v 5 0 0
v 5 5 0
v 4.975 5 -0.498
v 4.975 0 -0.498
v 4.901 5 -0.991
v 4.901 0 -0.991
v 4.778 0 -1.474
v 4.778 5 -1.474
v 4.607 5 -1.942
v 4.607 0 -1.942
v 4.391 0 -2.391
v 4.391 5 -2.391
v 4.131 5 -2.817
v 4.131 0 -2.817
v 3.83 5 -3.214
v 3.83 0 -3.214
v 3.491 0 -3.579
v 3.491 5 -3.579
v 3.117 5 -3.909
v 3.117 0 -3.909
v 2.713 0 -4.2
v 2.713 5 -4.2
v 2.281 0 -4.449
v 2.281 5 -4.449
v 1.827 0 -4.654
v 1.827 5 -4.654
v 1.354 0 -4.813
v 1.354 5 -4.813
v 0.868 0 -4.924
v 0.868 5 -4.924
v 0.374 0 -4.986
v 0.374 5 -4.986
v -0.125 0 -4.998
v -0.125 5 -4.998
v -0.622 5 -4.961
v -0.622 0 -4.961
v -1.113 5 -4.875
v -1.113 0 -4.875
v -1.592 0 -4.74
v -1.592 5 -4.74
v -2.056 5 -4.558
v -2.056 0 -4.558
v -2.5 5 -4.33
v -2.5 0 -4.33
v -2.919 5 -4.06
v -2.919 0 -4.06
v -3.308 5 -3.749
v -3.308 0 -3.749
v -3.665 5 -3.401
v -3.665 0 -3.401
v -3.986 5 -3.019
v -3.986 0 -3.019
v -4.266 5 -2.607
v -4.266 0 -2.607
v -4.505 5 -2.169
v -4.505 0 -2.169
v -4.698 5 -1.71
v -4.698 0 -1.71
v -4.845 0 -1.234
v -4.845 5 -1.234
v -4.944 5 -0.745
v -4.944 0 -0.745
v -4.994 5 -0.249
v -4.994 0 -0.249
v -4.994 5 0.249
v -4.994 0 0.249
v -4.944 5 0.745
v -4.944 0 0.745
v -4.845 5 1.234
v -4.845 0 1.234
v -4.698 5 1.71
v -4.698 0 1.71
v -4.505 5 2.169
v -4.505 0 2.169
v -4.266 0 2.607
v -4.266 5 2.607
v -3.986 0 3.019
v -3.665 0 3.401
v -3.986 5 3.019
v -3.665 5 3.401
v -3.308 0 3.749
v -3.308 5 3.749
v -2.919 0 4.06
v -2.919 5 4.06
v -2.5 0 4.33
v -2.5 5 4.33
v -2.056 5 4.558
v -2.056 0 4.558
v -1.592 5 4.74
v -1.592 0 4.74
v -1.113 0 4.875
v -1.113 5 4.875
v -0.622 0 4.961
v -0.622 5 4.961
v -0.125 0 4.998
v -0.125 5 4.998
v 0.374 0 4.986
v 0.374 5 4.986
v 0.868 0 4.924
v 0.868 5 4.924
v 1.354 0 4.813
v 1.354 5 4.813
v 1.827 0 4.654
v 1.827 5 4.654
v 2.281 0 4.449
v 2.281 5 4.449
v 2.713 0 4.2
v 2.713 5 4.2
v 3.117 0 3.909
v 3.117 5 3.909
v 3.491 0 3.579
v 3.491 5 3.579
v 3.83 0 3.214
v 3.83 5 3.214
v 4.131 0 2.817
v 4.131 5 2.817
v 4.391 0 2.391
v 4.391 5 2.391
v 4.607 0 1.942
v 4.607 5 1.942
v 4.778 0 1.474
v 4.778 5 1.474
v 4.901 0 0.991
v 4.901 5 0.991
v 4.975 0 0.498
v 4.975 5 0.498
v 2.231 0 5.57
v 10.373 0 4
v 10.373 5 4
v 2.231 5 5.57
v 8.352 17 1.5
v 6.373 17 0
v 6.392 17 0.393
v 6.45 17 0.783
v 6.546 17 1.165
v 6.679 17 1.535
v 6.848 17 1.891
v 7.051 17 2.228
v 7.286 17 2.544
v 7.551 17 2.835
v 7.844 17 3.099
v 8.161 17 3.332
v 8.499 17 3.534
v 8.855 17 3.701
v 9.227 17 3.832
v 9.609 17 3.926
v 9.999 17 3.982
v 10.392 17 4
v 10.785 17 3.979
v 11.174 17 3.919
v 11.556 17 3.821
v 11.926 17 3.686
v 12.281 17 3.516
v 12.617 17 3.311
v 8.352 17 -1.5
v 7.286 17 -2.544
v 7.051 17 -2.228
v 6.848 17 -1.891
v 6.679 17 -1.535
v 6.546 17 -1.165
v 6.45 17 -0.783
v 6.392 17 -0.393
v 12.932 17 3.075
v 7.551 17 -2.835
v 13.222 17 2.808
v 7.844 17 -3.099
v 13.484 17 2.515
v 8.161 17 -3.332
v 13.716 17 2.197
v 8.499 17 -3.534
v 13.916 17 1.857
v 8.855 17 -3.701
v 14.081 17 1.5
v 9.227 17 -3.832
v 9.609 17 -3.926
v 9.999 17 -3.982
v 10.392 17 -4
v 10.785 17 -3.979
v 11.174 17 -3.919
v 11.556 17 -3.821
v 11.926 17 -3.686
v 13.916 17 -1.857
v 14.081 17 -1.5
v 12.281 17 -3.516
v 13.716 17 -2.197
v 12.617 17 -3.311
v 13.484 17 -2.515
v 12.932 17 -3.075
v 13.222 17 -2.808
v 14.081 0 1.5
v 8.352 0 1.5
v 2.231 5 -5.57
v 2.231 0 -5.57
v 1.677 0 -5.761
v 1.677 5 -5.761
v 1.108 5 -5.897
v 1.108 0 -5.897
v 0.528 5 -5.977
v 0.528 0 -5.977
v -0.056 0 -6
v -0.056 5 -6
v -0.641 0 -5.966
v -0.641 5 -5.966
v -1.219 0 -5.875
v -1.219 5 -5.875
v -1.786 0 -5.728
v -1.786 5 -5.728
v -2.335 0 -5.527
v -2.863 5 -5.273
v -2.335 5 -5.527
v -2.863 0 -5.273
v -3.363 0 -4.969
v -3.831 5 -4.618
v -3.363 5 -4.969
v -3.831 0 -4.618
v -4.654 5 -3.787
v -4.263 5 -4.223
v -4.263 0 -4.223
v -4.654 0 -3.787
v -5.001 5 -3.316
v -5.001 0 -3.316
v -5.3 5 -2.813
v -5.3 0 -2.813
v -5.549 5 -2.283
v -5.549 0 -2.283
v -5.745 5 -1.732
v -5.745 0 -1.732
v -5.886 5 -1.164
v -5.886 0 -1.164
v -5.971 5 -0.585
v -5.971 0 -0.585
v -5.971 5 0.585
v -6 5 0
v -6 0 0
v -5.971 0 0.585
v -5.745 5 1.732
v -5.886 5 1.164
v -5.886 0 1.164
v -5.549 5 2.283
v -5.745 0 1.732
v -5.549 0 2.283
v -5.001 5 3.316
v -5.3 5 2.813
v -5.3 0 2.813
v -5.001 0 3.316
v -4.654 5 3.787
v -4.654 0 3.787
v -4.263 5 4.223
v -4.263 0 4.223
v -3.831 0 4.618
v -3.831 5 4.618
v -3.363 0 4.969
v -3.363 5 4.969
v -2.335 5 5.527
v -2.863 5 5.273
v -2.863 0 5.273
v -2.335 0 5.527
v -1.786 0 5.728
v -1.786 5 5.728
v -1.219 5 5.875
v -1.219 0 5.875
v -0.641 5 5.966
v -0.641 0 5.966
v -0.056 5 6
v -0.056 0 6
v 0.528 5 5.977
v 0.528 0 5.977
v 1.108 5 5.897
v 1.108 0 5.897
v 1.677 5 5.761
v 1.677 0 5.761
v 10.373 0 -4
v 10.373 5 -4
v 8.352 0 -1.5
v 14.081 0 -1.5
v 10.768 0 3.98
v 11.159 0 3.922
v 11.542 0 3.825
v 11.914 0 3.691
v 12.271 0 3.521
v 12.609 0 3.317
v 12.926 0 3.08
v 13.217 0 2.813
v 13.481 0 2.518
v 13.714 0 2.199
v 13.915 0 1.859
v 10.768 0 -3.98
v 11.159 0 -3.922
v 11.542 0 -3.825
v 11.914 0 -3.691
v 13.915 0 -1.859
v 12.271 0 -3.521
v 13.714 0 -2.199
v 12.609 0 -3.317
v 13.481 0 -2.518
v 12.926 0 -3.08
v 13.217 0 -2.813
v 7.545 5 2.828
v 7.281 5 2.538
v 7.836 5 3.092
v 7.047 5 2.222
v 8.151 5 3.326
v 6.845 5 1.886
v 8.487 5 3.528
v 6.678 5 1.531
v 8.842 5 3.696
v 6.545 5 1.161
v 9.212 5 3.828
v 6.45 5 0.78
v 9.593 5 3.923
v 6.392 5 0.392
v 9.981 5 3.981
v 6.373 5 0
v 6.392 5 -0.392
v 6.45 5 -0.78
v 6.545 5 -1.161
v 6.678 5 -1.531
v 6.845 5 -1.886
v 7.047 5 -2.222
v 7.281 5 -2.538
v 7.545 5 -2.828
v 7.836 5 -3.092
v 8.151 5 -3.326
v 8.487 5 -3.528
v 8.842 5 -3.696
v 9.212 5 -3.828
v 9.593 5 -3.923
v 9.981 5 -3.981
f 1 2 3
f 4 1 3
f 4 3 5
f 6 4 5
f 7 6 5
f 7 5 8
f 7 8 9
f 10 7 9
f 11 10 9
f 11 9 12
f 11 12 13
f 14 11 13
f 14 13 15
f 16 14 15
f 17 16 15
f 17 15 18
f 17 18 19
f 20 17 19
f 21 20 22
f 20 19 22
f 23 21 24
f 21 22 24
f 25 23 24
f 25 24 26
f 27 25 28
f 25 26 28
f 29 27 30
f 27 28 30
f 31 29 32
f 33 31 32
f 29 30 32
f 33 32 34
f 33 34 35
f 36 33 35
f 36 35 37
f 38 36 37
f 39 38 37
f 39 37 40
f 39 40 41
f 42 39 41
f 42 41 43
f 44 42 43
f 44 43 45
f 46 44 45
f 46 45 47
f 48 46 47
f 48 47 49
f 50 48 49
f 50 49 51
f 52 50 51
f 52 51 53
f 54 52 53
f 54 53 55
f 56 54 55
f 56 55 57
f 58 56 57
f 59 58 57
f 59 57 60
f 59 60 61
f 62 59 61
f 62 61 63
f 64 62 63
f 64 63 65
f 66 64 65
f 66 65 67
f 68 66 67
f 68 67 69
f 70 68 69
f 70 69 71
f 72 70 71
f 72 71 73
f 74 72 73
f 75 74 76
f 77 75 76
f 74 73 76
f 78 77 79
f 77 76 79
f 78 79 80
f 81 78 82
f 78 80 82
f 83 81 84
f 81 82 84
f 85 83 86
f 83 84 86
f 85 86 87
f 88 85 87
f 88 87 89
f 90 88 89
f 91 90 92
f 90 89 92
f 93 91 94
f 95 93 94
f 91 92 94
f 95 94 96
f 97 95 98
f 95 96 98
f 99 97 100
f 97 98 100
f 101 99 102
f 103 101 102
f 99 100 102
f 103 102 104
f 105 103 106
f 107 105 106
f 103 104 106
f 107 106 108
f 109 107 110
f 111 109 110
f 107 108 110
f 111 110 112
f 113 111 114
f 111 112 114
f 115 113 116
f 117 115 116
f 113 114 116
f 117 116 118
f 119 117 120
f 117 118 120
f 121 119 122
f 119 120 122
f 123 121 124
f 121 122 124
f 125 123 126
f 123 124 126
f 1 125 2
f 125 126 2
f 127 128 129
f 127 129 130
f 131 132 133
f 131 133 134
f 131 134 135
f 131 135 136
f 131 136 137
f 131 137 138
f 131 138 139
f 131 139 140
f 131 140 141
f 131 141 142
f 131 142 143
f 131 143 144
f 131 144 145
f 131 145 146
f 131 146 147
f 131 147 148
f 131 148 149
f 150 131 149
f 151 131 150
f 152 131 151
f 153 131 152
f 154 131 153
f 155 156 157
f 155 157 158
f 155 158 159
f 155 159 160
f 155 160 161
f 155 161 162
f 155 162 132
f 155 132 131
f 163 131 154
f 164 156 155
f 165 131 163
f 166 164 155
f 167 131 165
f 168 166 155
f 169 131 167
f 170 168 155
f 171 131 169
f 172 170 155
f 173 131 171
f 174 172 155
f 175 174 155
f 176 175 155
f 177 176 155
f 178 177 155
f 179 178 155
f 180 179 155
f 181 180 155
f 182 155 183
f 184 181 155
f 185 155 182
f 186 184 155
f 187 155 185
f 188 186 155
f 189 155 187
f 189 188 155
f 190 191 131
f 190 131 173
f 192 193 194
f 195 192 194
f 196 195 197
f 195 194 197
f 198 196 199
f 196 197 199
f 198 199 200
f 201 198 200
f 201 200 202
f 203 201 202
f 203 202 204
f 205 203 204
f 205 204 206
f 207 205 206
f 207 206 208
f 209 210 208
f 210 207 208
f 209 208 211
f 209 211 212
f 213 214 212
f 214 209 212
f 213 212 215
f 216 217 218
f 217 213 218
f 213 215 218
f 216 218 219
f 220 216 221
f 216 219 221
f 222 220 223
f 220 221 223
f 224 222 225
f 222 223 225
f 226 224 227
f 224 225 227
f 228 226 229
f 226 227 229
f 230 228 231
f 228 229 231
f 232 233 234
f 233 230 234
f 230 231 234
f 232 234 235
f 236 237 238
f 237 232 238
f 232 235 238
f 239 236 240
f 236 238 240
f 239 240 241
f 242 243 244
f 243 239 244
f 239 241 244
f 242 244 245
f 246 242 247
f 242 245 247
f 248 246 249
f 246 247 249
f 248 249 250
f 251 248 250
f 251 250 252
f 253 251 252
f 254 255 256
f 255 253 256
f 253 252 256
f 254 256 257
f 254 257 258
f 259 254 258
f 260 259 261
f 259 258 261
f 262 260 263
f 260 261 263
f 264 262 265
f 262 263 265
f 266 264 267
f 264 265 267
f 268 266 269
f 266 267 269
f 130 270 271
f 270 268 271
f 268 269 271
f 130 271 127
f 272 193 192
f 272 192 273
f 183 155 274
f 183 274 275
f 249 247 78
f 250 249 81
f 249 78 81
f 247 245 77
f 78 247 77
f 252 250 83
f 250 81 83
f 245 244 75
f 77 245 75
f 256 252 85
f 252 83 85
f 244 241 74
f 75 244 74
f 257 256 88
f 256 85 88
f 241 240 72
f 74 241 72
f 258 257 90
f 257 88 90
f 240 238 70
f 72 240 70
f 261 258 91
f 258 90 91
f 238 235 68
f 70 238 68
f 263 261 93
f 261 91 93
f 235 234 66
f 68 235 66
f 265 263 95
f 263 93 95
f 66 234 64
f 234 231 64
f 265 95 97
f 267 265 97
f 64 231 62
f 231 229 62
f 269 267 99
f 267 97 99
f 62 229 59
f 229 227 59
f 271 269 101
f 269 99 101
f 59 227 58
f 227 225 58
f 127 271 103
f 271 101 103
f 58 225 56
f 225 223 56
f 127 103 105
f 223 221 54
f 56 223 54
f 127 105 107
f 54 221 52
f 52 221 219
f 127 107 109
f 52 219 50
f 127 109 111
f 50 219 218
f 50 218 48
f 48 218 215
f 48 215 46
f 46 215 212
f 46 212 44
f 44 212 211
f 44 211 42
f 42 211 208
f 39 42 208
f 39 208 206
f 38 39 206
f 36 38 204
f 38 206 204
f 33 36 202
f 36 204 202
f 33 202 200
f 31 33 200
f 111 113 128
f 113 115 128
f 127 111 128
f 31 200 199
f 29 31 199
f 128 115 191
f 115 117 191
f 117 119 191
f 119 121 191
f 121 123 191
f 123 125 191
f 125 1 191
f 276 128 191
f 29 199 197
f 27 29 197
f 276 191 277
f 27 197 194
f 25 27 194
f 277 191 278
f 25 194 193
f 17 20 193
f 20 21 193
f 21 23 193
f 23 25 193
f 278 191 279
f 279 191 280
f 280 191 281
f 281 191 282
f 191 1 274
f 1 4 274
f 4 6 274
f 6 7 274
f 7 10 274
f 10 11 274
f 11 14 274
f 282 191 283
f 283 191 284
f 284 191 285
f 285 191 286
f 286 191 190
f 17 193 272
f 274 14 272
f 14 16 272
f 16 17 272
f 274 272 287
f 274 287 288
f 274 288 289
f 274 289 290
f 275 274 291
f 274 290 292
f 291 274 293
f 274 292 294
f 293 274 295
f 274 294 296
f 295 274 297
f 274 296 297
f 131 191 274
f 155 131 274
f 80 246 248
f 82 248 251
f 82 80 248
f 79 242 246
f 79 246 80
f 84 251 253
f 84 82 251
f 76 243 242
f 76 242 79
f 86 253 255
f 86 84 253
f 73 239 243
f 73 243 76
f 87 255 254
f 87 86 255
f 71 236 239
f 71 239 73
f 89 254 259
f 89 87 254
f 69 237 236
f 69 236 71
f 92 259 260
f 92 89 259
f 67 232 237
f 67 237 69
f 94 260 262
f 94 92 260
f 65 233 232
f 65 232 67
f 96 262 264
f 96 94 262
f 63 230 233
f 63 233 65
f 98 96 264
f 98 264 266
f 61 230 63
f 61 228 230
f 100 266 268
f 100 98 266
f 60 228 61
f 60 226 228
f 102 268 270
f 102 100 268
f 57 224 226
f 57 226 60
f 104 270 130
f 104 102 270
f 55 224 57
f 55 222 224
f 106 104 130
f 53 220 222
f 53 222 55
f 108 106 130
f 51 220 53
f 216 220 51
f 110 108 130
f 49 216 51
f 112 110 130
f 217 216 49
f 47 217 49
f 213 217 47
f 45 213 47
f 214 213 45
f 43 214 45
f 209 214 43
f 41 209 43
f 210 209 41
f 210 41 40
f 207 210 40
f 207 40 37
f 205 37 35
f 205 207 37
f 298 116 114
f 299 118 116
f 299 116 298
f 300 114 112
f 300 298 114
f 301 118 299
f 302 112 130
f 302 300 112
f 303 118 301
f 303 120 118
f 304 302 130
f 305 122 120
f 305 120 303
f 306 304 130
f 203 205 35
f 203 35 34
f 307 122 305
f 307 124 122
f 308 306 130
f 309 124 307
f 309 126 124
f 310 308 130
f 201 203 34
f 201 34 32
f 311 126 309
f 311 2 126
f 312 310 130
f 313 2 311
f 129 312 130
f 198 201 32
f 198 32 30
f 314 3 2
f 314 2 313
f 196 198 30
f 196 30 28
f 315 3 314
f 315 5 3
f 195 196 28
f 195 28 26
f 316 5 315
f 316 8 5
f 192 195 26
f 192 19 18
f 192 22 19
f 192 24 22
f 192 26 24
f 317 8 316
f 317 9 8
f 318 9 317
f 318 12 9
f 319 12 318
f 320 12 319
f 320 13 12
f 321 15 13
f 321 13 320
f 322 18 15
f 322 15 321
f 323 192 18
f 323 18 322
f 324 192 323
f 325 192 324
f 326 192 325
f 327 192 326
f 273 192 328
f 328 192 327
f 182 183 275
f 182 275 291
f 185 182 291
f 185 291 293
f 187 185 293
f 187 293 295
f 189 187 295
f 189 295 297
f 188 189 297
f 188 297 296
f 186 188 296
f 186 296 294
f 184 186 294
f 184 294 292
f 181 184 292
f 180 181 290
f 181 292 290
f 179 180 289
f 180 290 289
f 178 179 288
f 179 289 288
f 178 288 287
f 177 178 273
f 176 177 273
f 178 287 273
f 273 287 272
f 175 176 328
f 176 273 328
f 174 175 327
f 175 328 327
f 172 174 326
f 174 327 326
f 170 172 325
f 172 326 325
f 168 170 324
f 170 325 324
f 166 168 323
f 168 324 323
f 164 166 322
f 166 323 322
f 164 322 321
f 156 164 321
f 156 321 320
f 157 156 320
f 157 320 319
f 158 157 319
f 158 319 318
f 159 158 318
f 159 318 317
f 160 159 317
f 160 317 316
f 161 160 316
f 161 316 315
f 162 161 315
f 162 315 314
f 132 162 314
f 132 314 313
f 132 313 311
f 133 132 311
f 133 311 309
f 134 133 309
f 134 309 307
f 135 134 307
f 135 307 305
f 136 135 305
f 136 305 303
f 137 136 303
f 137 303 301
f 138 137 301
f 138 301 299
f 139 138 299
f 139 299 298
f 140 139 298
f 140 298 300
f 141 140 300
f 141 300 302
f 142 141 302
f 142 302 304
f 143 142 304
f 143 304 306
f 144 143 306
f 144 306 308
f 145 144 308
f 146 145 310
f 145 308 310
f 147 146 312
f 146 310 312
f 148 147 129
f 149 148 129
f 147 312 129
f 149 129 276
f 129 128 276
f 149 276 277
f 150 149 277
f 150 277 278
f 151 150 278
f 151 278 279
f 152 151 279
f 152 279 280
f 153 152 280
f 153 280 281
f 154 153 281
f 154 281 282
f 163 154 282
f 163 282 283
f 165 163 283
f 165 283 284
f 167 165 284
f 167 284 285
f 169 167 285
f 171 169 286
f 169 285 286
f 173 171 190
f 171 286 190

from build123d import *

# Parameters (mm, degrees)
SKETCH_1_R          = 6
EXTRUDE_1_DEPTH     = 5
SKETCH_3_R          = 4
EXTRUDE_2_DEPTH     = 5
EXTRUDE_3_DEPTH     = 5
SKETCH_2_R          = 5
CUT_EXTRUDE_1_DEPTH = 6
SKETCH_5_R          = 4
EXTRUDE_4_DEPTH     = 12
SKETCH_6_W          = 10.625447748
SKETCH_6_H          = 3
CUT_EXTRUDE_2_DEPTH = 18


with BuildPart() as part:
    # 草图1 → 凸台-拉伸1 (new body)
    with BuildSketch(Plane(origin=(0, 0, 0), x_dir=(1, 0, 0), z_dir=(0, 1, 0))):
        Circle(SKETCH_1_R)
    extrude(amount=EXTRUDE_1_DEPTH)



with BuildPart() as body_2:
    # 草图3 → 凸台-拉伸2 (new body)
    with BuildSketch(Plane(origin=(0, 0, 0), x_dir=(1, 0, 0), z_dir=(0, 1, 0))):
        with Locations((10.373073214, 0)):
            Circle(SKETCH_3_R)
    extrude(amount=EXTRUDE_2_DEPTH)


with BuildPart() as part_1:
    add(part.part)

    add(body_2.part)  # 凸台-拉伸3 merges body 2
    # 草图4 → 凸台-拉伸3 (add)
    with BuildSketch(Plane(origin=(0, 0, 0), x_dir=(1, 0, 0), z_dir=(0, 1, 0))):
        Polygon((0, 6), (10.373073214, 4), (10.373073214, -4), (0, -6), align=None)
    extrude(amount=EXTRUDE_3_DEPTH)

    # 草图2 → 切除-拉伸1 (cut, through all)
    with BuildSketch(Plane(origin=(0, 5, 0), x_dir=(1, 0, 0), z_dir=(0, 1, 0))):
        Circle(SKETCH_2_R)
    extrude(amount=-CUT_EXTRUDE_1_DEPTH, mode=Mode.SUBTRACT)

    # 草图5 → 凸台-拉伸4 (add)
    with BuildSketch(Plane(origin=(0, 5, 0), x_dir=(1, 0, 0), z_dir=(0, 1, 0))):
        with Locations((10.373073214, 0)):
            Circle(SKETCH_5_R)
    extrude(amount=EXTRUDE_4_DEPTH)

    # 草图6 → 切除-拉伸2 (cut, through all)
    with BuildSketch(Plane(origin=(0, 17, 0), x_dir=(1, 0, 0), z_dir=(0, 1, 0))):
        with Locations((13.66467232, 0)):
            Rectangle(SKETCH_6_W, SKETCH_6_H)
    extrude(amount=-CUT_EXTRUDE_2_DEPTH, mode=Mode.SUBTRACT)


solid = part_1.part
